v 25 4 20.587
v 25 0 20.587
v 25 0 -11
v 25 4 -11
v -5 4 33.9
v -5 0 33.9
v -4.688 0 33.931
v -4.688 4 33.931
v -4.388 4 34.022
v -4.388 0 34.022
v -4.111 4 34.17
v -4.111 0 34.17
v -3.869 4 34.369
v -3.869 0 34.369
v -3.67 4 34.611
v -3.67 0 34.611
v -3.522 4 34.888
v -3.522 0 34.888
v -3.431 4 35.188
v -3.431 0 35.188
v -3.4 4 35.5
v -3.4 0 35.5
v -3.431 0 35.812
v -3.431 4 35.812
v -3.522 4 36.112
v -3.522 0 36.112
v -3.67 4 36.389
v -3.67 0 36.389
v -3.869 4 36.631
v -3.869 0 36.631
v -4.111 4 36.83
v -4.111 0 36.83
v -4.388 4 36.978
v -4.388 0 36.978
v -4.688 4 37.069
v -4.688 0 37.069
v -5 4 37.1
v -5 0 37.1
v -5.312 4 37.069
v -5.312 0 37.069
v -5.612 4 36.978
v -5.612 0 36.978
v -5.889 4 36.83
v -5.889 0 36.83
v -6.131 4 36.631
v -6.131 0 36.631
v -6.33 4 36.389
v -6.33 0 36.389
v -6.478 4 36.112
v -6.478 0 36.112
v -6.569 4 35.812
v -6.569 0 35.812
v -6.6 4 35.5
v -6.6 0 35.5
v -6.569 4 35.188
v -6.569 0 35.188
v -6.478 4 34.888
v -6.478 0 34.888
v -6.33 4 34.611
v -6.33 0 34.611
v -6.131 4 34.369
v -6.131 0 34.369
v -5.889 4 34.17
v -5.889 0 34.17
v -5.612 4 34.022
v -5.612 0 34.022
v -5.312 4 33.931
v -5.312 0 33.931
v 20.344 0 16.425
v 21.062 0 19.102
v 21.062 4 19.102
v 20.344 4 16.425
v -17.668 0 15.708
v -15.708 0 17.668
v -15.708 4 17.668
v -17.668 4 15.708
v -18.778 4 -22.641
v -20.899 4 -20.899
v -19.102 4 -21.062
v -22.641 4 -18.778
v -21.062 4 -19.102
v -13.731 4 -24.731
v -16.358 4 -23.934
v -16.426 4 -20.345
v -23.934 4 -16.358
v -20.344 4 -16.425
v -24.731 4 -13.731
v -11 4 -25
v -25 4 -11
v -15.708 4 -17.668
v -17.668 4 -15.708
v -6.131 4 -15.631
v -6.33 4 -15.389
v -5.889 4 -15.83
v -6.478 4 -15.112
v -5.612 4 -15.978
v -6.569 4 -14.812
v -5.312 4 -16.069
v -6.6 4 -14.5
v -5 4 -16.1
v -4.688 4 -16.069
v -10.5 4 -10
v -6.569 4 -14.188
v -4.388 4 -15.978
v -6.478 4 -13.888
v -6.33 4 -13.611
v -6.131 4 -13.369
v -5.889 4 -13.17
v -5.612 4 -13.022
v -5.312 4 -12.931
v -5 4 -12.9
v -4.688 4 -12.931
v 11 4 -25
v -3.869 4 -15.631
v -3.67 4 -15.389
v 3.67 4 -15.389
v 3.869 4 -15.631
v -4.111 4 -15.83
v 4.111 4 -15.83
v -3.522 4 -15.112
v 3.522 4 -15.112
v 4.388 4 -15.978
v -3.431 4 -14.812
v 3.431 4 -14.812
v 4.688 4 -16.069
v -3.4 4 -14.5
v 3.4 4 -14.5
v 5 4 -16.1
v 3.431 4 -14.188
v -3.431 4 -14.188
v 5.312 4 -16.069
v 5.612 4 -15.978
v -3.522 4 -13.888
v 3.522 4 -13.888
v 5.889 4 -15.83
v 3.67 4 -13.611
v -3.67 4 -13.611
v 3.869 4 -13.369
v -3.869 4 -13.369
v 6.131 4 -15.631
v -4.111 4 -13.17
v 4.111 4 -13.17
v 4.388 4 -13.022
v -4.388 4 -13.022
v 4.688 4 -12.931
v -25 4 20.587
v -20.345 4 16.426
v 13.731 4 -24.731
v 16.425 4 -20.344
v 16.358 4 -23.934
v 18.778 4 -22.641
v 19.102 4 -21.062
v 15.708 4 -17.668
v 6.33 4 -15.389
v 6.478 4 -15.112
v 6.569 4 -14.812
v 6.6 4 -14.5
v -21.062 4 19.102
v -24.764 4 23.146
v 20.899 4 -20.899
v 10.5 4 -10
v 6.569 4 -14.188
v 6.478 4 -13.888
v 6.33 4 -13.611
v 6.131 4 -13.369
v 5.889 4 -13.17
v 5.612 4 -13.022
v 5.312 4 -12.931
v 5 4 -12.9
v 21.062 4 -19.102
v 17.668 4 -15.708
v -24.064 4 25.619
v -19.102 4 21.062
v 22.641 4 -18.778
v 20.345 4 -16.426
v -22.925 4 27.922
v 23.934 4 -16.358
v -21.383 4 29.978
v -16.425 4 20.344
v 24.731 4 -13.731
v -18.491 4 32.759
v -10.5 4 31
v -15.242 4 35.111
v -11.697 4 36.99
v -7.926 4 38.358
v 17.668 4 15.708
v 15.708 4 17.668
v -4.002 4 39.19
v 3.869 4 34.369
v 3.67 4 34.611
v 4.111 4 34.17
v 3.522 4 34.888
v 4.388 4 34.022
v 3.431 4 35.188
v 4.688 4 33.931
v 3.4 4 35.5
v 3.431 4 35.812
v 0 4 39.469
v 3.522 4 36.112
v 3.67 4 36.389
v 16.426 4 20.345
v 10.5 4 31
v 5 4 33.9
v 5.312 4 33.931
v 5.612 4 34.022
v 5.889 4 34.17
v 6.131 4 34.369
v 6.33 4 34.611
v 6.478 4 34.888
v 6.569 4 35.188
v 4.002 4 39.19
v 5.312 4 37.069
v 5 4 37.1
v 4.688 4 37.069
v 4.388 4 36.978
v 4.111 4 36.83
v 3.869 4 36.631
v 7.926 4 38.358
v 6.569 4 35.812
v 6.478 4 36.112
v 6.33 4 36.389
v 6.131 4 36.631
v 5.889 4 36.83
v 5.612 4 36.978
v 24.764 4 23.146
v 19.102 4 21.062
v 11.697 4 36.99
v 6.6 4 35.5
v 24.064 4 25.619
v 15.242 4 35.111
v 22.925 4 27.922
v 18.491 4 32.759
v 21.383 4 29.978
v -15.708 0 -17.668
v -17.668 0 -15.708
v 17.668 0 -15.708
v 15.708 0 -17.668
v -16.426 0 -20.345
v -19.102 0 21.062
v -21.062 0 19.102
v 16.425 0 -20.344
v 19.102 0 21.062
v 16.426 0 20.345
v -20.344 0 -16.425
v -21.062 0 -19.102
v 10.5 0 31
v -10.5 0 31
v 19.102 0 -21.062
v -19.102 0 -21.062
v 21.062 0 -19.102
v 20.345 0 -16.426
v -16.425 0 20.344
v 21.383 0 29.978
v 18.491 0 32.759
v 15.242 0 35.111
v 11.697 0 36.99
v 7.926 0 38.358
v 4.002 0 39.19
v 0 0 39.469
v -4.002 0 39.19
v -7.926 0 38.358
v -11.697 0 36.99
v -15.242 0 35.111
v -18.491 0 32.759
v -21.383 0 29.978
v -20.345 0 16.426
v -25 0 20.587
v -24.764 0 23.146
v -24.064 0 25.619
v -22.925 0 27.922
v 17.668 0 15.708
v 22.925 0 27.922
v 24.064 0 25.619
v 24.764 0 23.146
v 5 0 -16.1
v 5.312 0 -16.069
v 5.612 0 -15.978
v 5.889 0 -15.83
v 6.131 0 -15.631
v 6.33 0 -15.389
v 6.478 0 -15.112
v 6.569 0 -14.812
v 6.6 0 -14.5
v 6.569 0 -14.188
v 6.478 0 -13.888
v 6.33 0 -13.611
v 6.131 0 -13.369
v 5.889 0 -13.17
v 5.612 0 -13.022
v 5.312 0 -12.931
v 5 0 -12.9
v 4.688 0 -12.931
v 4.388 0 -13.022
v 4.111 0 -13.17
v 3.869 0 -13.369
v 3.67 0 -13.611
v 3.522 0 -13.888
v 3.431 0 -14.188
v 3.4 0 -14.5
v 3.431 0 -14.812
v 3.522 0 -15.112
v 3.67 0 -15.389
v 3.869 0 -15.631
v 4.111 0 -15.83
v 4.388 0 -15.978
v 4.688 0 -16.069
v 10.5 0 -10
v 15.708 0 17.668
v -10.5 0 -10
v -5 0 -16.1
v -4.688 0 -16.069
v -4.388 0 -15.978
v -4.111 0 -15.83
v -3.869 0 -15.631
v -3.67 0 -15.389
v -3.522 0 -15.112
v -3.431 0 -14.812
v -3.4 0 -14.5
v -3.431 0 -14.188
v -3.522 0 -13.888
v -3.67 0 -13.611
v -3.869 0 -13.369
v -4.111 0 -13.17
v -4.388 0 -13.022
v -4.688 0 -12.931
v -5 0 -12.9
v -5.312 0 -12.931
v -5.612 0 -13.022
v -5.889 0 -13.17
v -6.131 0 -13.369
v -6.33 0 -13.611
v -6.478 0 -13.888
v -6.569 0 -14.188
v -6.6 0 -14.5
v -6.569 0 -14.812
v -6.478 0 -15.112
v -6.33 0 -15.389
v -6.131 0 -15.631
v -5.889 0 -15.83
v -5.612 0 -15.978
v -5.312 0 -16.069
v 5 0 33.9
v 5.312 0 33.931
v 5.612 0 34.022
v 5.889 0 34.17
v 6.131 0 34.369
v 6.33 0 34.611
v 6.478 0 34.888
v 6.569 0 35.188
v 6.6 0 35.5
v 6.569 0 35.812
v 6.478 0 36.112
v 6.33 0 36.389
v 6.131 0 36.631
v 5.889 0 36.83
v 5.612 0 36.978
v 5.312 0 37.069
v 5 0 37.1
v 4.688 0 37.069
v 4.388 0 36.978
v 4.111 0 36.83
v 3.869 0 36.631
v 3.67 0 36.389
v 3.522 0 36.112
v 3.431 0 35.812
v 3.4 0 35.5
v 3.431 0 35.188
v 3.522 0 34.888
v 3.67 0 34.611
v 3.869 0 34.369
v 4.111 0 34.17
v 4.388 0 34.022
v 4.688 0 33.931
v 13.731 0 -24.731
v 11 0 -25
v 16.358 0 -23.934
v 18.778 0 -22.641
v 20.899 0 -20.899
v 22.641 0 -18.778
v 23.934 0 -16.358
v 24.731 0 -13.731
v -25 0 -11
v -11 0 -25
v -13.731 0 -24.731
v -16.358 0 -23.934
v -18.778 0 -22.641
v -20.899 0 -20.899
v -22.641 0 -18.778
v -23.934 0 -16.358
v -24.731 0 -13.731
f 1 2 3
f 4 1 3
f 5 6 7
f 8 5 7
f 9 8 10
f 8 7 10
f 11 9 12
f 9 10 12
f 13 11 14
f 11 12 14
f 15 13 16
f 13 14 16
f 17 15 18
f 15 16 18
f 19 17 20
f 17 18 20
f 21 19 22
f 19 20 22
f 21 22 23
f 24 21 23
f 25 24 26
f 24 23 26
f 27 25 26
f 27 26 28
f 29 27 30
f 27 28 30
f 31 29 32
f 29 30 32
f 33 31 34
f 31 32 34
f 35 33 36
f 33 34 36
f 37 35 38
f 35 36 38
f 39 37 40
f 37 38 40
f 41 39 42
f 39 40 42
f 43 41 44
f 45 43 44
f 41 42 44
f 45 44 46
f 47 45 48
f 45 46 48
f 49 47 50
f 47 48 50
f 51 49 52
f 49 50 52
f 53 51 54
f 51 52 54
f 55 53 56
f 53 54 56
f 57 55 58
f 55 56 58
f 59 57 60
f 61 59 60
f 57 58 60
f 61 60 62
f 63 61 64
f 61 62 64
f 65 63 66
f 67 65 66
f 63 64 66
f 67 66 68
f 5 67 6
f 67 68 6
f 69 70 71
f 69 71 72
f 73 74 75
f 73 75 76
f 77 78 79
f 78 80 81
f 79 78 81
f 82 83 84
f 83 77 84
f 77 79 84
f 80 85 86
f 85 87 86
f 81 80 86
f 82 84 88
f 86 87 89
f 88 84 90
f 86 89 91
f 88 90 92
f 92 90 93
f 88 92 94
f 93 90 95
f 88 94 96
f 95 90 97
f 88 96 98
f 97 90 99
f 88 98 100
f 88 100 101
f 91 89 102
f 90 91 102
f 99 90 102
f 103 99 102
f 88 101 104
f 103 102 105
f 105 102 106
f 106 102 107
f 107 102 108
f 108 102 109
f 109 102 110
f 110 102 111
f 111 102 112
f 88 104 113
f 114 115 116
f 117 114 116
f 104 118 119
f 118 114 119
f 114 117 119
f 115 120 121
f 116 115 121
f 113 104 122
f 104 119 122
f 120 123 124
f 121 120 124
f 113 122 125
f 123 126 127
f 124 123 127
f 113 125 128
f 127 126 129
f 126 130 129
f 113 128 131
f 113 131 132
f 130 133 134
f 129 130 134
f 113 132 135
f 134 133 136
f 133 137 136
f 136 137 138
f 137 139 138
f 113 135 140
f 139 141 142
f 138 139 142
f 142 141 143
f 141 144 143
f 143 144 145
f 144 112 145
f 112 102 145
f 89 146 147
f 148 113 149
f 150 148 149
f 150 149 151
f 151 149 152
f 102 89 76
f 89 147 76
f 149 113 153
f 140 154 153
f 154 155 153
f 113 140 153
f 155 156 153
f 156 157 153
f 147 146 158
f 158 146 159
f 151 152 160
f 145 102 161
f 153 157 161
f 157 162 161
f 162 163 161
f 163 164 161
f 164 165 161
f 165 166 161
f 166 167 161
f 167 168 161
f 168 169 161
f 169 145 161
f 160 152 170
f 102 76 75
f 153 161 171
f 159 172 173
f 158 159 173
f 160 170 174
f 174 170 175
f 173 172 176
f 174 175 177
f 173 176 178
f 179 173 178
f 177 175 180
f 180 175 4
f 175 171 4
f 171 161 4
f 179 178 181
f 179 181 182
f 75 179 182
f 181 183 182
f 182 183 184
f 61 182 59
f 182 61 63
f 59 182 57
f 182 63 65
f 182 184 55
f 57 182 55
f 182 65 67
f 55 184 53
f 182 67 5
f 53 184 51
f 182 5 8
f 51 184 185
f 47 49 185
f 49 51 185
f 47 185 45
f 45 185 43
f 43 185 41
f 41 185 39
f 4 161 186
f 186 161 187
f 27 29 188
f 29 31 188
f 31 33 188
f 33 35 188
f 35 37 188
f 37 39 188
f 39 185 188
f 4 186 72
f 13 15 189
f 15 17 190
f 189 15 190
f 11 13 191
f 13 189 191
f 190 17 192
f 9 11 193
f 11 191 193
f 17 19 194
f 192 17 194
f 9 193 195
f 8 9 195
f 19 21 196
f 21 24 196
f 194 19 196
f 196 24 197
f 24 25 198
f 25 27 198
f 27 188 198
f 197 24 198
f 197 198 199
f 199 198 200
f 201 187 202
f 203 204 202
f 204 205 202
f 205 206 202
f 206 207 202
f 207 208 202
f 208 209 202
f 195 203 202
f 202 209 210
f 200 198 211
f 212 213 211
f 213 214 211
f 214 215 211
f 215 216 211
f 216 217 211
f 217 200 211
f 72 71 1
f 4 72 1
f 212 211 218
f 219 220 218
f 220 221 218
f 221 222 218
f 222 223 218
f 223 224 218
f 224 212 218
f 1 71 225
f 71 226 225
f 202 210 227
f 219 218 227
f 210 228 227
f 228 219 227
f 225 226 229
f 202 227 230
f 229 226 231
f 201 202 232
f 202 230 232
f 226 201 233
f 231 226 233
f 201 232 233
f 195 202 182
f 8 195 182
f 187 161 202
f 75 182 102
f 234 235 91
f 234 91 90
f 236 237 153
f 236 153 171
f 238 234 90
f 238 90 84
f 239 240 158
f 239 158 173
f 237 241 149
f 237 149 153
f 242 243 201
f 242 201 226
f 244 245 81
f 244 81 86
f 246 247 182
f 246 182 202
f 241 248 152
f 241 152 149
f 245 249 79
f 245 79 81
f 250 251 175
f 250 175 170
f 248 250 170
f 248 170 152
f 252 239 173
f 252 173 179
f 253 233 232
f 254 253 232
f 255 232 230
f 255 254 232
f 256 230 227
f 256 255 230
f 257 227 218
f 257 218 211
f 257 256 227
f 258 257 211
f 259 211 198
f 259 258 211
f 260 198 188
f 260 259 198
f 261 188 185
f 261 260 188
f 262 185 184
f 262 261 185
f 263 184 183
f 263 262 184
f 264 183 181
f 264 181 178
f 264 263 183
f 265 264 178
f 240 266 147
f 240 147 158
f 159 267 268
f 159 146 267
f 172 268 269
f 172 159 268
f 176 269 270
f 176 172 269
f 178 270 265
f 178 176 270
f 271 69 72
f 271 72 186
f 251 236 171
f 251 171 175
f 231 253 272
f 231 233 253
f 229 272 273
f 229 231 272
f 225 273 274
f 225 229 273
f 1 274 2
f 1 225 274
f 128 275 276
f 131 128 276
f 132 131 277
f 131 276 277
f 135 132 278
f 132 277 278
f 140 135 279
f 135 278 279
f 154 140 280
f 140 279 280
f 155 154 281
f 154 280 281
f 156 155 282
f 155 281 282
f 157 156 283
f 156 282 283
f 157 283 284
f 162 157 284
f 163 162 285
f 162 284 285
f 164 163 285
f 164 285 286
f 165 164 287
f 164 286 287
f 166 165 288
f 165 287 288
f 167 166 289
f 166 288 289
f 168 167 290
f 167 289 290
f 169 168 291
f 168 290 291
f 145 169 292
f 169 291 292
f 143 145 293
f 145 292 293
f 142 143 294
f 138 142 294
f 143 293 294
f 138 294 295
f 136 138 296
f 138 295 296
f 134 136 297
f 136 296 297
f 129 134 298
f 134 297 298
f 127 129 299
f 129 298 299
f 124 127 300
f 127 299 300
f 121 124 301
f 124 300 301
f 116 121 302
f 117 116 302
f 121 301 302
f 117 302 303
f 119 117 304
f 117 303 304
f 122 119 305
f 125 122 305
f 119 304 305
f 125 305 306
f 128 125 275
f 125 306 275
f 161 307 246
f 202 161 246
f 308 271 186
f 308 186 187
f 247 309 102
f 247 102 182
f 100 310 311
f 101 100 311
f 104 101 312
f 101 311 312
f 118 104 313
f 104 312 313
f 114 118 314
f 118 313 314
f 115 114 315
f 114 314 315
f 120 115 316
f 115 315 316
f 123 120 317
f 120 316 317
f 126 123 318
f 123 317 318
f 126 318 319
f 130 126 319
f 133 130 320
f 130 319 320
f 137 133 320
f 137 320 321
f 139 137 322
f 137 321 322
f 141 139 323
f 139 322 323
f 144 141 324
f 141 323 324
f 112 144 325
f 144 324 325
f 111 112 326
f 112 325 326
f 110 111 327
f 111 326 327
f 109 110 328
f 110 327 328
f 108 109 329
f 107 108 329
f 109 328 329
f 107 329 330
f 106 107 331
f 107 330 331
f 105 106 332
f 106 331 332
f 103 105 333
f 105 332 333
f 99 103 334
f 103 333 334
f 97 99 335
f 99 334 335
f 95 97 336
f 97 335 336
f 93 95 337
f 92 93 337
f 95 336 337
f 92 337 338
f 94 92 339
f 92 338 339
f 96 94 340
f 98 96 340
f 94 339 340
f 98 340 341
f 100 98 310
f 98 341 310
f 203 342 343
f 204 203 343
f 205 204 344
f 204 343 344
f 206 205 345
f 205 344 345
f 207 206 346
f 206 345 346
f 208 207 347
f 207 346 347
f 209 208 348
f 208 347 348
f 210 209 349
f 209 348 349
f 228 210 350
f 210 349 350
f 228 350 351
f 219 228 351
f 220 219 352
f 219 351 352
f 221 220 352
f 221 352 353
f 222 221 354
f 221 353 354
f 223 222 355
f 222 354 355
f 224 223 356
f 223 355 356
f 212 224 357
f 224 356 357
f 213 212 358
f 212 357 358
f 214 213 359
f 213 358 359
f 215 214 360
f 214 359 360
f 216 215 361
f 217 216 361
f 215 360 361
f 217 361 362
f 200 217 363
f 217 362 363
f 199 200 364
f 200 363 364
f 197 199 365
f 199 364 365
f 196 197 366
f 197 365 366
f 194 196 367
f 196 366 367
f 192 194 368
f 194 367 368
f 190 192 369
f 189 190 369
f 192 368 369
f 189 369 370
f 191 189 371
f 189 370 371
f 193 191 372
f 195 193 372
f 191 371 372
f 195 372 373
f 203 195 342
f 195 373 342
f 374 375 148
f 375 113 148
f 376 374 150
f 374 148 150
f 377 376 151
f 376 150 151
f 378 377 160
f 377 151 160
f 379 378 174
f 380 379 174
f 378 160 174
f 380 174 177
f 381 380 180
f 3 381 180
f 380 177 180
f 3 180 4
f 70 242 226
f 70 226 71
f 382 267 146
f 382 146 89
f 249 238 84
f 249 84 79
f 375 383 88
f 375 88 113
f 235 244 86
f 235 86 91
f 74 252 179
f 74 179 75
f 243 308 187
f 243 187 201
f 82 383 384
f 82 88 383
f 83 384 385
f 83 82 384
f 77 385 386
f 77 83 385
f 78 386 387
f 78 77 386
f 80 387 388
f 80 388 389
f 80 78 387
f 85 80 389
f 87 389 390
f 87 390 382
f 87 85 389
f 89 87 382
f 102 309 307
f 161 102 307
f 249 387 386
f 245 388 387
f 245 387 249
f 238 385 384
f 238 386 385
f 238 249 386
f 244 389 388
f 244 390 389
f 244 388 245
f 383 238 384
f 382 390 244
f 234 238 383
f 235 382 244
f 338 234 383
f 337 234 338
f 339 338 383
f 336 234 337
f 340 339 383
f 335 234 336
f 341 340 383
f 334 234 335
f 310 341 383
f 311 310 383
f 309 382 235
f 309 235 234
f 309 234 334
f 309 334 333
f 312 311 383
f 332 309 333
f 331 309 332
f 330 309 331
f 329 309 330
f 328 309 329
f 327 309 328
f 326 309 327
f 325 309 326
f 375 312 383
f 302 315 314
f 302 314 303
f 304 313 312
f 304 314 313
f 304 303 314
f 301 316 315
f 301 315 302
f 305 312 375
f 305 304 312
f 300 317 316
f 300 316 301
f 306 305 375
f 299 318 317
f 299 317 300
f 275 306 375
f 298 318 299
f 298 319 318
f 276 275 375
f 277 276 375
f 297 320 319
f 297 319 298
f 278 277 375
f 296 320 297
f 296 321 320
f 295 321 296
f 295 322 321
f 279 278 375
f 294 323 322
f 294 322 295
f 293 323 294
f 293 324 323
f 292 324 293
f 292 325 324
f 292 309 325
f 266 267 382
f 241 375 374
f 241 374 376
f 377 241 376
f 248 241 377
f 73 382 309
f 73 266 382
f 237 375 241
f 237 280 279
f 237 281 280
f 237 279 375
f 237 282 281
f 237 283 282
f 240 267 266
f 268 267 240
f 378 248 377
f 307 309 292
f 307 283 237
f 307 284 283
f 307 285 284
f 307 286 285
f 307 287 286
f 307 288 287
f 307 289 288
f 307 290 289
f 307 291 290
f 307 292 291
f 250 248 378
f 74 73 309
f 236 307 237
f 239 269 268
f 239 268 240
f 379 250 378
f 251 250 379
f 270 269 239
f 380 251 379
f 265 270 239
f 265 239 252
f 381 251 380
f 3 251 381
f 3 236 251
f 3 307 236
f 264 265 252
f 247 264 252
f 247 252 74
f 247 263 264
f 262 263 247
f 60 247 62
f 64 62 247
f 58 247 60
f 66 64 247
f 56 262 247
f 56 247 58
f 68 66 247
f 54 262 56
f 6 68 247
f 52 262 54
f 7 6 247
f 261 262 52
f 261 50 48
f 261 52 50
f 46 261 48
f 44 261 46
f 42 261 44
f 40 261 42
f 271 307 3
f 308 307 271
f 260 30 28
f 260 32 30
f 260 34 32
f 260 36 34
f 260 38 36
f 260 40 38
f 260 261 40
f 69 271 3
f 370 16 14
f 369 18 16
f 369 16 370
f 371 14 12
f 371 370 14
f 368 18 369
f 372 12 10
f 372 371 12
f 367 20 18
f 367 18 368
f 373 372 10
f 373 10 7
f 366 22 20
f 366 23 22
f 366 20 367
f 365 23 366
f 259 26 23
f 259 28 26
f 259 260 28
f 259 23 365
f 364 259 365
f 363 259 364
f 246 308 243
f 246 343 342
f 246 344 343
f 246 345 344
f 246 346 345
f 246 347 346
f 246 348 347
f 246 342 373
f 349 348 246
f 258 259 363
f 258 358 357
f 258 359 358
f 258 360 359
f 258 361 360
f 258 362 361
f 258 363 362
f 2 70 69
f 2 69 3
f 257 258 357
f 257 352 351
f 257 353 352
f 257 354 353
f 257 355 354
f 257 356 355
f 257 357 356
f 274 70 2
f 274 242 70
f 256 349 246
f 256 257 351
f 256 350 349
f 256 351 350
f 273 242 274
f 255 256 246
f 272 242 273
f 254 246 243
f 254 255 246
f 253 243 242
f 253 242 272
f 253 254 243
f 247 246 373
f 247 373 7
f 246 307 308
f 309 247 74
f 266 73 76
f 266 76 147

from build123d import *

# Parameters (mm, degrees)
SKETCH_1_W          = 50
SKETCH_1_H          = 50
EXTRUDE_1_DEPTH     = 4
SKETCH_2_R          = 1.6
EXTRUDE_2_DEPTH     = 4
SKETCH_2_3_W        = 21
SKETCH_2_3_H        = 35
SKETCH_2_3_R        = 1.6
CUT_EXTRUDE_1_DEPTH = 4
FILLET_1_R          = 14
FILLET_2_R          = 14


with BuildPart() as part:
    # 草图1 → 凸台-拉伸1 (new body)
    with BuildSketch(Plane(origin=(0, 0, 0), x_dir=(1, 0, 0), z_dir=(0, 1, 0))):
        Rectangle(SKETCH_1_W, SKETCH_1_H)
        Polygon((15.708195736, 17.66756085), (17.667918398, 15.708099932), (20.344722661, 16.425539082), (21.061804264, 19.10243915), (19.102081602, 21.061900068), (16.425277339, 20.344460918), align=None, mode=Mode.SUBTRACT)
        Polygon((-17.66756085, 15.708195736), (-15.708099932, 17.667918398), (-16.425539082, 20.344722661), (-19.10243915, 21.061804264), (-21.061900068, 19.102081602), (-20.344460918, 16.425277339), align=None, mode=Mode.SUBTRACT)
        Polygon((17.66756085, -15.708195736), (15.708099932, -17.667918398), (16.425539082, -20.344722661), (19.10243915, -21.061804264), (21.061900068, -19.102081602), (20.344460918, -16.425277339), align=None, mode=Mode.SUBTRACT)
        Polygon((-15.708195736, -17.66756085), (-17.667918398, -15.708099932), (-20.344722661, -16.425539082), (-21.061804264, -19.10243915), (-19.102081602, -21.061900068), (-16.425277339, -20.344460918), align=None, mode=Mode.SUBTRACT)
    extrude(amount=EXTRUDE_1_DEPTH)

    # 草图2 → 凸台-拉伸2 (add)
    with BuildSketch(Plane.XZ):
        with BuildLine():
            ThreePointArc((25, 25), (0, 39.469136454), (-25, 25))
            Line((-25, 25), (-10.5, 25))
            Line((-10.5, 25), (-10.5, 31))
            Line((-10.5, 31), (10.5, 31))
            Line((10.5, 31), (10.5, 25))
            Line((10.5, 25), (25, 25))
        make_face()
        with Locations((-5, 35.5)):
            Circle(SKETCH_2_R, mode=Mode.SUBTRACT)
        with Locations((5, 35.5)):
            Circle(SKETCH_2_R, mode=Mode.SUBTRACT)
    extrude(amount=-EXTRUDE_2_DEPTH)

    # 草图2<3> → 切除-拉伸1 (cut)
    with BuildSketch(Plane.XZ):
        with Locations((0, 7.5)):
            Rectangle(SKETCH_2_3_W, SKETCH_2_3_H)
        with Locations((-5, -14.5)):
            Circle(SKETCH_2_3_R)
        with Locations((5, -14.5)):
            Circle(SKETCH_2_3_R)
    extrude(amount=-CUT_EXTRUDE_1_DEPTH, mode=Mode.SUBTRACT)

    # 圆角1
    fillet_1_edges = [part.edges().sort_by_distance(p)[0] for p in [
        (25, 2, -25),
        (-25, 2, -25),
    ]]
    fillet(fillet_1_edges, radius=FILLET_1_R)

    # 圆角2
    fillet_2_edges = [part.edges().sort_by_distance(p)[0] for p in [
        (25, 2, 25),
        (-25, 2, 25),
    ]]
    fillet(fillet_2_edges, radius=FILLET_2_R)


solid = part.part
